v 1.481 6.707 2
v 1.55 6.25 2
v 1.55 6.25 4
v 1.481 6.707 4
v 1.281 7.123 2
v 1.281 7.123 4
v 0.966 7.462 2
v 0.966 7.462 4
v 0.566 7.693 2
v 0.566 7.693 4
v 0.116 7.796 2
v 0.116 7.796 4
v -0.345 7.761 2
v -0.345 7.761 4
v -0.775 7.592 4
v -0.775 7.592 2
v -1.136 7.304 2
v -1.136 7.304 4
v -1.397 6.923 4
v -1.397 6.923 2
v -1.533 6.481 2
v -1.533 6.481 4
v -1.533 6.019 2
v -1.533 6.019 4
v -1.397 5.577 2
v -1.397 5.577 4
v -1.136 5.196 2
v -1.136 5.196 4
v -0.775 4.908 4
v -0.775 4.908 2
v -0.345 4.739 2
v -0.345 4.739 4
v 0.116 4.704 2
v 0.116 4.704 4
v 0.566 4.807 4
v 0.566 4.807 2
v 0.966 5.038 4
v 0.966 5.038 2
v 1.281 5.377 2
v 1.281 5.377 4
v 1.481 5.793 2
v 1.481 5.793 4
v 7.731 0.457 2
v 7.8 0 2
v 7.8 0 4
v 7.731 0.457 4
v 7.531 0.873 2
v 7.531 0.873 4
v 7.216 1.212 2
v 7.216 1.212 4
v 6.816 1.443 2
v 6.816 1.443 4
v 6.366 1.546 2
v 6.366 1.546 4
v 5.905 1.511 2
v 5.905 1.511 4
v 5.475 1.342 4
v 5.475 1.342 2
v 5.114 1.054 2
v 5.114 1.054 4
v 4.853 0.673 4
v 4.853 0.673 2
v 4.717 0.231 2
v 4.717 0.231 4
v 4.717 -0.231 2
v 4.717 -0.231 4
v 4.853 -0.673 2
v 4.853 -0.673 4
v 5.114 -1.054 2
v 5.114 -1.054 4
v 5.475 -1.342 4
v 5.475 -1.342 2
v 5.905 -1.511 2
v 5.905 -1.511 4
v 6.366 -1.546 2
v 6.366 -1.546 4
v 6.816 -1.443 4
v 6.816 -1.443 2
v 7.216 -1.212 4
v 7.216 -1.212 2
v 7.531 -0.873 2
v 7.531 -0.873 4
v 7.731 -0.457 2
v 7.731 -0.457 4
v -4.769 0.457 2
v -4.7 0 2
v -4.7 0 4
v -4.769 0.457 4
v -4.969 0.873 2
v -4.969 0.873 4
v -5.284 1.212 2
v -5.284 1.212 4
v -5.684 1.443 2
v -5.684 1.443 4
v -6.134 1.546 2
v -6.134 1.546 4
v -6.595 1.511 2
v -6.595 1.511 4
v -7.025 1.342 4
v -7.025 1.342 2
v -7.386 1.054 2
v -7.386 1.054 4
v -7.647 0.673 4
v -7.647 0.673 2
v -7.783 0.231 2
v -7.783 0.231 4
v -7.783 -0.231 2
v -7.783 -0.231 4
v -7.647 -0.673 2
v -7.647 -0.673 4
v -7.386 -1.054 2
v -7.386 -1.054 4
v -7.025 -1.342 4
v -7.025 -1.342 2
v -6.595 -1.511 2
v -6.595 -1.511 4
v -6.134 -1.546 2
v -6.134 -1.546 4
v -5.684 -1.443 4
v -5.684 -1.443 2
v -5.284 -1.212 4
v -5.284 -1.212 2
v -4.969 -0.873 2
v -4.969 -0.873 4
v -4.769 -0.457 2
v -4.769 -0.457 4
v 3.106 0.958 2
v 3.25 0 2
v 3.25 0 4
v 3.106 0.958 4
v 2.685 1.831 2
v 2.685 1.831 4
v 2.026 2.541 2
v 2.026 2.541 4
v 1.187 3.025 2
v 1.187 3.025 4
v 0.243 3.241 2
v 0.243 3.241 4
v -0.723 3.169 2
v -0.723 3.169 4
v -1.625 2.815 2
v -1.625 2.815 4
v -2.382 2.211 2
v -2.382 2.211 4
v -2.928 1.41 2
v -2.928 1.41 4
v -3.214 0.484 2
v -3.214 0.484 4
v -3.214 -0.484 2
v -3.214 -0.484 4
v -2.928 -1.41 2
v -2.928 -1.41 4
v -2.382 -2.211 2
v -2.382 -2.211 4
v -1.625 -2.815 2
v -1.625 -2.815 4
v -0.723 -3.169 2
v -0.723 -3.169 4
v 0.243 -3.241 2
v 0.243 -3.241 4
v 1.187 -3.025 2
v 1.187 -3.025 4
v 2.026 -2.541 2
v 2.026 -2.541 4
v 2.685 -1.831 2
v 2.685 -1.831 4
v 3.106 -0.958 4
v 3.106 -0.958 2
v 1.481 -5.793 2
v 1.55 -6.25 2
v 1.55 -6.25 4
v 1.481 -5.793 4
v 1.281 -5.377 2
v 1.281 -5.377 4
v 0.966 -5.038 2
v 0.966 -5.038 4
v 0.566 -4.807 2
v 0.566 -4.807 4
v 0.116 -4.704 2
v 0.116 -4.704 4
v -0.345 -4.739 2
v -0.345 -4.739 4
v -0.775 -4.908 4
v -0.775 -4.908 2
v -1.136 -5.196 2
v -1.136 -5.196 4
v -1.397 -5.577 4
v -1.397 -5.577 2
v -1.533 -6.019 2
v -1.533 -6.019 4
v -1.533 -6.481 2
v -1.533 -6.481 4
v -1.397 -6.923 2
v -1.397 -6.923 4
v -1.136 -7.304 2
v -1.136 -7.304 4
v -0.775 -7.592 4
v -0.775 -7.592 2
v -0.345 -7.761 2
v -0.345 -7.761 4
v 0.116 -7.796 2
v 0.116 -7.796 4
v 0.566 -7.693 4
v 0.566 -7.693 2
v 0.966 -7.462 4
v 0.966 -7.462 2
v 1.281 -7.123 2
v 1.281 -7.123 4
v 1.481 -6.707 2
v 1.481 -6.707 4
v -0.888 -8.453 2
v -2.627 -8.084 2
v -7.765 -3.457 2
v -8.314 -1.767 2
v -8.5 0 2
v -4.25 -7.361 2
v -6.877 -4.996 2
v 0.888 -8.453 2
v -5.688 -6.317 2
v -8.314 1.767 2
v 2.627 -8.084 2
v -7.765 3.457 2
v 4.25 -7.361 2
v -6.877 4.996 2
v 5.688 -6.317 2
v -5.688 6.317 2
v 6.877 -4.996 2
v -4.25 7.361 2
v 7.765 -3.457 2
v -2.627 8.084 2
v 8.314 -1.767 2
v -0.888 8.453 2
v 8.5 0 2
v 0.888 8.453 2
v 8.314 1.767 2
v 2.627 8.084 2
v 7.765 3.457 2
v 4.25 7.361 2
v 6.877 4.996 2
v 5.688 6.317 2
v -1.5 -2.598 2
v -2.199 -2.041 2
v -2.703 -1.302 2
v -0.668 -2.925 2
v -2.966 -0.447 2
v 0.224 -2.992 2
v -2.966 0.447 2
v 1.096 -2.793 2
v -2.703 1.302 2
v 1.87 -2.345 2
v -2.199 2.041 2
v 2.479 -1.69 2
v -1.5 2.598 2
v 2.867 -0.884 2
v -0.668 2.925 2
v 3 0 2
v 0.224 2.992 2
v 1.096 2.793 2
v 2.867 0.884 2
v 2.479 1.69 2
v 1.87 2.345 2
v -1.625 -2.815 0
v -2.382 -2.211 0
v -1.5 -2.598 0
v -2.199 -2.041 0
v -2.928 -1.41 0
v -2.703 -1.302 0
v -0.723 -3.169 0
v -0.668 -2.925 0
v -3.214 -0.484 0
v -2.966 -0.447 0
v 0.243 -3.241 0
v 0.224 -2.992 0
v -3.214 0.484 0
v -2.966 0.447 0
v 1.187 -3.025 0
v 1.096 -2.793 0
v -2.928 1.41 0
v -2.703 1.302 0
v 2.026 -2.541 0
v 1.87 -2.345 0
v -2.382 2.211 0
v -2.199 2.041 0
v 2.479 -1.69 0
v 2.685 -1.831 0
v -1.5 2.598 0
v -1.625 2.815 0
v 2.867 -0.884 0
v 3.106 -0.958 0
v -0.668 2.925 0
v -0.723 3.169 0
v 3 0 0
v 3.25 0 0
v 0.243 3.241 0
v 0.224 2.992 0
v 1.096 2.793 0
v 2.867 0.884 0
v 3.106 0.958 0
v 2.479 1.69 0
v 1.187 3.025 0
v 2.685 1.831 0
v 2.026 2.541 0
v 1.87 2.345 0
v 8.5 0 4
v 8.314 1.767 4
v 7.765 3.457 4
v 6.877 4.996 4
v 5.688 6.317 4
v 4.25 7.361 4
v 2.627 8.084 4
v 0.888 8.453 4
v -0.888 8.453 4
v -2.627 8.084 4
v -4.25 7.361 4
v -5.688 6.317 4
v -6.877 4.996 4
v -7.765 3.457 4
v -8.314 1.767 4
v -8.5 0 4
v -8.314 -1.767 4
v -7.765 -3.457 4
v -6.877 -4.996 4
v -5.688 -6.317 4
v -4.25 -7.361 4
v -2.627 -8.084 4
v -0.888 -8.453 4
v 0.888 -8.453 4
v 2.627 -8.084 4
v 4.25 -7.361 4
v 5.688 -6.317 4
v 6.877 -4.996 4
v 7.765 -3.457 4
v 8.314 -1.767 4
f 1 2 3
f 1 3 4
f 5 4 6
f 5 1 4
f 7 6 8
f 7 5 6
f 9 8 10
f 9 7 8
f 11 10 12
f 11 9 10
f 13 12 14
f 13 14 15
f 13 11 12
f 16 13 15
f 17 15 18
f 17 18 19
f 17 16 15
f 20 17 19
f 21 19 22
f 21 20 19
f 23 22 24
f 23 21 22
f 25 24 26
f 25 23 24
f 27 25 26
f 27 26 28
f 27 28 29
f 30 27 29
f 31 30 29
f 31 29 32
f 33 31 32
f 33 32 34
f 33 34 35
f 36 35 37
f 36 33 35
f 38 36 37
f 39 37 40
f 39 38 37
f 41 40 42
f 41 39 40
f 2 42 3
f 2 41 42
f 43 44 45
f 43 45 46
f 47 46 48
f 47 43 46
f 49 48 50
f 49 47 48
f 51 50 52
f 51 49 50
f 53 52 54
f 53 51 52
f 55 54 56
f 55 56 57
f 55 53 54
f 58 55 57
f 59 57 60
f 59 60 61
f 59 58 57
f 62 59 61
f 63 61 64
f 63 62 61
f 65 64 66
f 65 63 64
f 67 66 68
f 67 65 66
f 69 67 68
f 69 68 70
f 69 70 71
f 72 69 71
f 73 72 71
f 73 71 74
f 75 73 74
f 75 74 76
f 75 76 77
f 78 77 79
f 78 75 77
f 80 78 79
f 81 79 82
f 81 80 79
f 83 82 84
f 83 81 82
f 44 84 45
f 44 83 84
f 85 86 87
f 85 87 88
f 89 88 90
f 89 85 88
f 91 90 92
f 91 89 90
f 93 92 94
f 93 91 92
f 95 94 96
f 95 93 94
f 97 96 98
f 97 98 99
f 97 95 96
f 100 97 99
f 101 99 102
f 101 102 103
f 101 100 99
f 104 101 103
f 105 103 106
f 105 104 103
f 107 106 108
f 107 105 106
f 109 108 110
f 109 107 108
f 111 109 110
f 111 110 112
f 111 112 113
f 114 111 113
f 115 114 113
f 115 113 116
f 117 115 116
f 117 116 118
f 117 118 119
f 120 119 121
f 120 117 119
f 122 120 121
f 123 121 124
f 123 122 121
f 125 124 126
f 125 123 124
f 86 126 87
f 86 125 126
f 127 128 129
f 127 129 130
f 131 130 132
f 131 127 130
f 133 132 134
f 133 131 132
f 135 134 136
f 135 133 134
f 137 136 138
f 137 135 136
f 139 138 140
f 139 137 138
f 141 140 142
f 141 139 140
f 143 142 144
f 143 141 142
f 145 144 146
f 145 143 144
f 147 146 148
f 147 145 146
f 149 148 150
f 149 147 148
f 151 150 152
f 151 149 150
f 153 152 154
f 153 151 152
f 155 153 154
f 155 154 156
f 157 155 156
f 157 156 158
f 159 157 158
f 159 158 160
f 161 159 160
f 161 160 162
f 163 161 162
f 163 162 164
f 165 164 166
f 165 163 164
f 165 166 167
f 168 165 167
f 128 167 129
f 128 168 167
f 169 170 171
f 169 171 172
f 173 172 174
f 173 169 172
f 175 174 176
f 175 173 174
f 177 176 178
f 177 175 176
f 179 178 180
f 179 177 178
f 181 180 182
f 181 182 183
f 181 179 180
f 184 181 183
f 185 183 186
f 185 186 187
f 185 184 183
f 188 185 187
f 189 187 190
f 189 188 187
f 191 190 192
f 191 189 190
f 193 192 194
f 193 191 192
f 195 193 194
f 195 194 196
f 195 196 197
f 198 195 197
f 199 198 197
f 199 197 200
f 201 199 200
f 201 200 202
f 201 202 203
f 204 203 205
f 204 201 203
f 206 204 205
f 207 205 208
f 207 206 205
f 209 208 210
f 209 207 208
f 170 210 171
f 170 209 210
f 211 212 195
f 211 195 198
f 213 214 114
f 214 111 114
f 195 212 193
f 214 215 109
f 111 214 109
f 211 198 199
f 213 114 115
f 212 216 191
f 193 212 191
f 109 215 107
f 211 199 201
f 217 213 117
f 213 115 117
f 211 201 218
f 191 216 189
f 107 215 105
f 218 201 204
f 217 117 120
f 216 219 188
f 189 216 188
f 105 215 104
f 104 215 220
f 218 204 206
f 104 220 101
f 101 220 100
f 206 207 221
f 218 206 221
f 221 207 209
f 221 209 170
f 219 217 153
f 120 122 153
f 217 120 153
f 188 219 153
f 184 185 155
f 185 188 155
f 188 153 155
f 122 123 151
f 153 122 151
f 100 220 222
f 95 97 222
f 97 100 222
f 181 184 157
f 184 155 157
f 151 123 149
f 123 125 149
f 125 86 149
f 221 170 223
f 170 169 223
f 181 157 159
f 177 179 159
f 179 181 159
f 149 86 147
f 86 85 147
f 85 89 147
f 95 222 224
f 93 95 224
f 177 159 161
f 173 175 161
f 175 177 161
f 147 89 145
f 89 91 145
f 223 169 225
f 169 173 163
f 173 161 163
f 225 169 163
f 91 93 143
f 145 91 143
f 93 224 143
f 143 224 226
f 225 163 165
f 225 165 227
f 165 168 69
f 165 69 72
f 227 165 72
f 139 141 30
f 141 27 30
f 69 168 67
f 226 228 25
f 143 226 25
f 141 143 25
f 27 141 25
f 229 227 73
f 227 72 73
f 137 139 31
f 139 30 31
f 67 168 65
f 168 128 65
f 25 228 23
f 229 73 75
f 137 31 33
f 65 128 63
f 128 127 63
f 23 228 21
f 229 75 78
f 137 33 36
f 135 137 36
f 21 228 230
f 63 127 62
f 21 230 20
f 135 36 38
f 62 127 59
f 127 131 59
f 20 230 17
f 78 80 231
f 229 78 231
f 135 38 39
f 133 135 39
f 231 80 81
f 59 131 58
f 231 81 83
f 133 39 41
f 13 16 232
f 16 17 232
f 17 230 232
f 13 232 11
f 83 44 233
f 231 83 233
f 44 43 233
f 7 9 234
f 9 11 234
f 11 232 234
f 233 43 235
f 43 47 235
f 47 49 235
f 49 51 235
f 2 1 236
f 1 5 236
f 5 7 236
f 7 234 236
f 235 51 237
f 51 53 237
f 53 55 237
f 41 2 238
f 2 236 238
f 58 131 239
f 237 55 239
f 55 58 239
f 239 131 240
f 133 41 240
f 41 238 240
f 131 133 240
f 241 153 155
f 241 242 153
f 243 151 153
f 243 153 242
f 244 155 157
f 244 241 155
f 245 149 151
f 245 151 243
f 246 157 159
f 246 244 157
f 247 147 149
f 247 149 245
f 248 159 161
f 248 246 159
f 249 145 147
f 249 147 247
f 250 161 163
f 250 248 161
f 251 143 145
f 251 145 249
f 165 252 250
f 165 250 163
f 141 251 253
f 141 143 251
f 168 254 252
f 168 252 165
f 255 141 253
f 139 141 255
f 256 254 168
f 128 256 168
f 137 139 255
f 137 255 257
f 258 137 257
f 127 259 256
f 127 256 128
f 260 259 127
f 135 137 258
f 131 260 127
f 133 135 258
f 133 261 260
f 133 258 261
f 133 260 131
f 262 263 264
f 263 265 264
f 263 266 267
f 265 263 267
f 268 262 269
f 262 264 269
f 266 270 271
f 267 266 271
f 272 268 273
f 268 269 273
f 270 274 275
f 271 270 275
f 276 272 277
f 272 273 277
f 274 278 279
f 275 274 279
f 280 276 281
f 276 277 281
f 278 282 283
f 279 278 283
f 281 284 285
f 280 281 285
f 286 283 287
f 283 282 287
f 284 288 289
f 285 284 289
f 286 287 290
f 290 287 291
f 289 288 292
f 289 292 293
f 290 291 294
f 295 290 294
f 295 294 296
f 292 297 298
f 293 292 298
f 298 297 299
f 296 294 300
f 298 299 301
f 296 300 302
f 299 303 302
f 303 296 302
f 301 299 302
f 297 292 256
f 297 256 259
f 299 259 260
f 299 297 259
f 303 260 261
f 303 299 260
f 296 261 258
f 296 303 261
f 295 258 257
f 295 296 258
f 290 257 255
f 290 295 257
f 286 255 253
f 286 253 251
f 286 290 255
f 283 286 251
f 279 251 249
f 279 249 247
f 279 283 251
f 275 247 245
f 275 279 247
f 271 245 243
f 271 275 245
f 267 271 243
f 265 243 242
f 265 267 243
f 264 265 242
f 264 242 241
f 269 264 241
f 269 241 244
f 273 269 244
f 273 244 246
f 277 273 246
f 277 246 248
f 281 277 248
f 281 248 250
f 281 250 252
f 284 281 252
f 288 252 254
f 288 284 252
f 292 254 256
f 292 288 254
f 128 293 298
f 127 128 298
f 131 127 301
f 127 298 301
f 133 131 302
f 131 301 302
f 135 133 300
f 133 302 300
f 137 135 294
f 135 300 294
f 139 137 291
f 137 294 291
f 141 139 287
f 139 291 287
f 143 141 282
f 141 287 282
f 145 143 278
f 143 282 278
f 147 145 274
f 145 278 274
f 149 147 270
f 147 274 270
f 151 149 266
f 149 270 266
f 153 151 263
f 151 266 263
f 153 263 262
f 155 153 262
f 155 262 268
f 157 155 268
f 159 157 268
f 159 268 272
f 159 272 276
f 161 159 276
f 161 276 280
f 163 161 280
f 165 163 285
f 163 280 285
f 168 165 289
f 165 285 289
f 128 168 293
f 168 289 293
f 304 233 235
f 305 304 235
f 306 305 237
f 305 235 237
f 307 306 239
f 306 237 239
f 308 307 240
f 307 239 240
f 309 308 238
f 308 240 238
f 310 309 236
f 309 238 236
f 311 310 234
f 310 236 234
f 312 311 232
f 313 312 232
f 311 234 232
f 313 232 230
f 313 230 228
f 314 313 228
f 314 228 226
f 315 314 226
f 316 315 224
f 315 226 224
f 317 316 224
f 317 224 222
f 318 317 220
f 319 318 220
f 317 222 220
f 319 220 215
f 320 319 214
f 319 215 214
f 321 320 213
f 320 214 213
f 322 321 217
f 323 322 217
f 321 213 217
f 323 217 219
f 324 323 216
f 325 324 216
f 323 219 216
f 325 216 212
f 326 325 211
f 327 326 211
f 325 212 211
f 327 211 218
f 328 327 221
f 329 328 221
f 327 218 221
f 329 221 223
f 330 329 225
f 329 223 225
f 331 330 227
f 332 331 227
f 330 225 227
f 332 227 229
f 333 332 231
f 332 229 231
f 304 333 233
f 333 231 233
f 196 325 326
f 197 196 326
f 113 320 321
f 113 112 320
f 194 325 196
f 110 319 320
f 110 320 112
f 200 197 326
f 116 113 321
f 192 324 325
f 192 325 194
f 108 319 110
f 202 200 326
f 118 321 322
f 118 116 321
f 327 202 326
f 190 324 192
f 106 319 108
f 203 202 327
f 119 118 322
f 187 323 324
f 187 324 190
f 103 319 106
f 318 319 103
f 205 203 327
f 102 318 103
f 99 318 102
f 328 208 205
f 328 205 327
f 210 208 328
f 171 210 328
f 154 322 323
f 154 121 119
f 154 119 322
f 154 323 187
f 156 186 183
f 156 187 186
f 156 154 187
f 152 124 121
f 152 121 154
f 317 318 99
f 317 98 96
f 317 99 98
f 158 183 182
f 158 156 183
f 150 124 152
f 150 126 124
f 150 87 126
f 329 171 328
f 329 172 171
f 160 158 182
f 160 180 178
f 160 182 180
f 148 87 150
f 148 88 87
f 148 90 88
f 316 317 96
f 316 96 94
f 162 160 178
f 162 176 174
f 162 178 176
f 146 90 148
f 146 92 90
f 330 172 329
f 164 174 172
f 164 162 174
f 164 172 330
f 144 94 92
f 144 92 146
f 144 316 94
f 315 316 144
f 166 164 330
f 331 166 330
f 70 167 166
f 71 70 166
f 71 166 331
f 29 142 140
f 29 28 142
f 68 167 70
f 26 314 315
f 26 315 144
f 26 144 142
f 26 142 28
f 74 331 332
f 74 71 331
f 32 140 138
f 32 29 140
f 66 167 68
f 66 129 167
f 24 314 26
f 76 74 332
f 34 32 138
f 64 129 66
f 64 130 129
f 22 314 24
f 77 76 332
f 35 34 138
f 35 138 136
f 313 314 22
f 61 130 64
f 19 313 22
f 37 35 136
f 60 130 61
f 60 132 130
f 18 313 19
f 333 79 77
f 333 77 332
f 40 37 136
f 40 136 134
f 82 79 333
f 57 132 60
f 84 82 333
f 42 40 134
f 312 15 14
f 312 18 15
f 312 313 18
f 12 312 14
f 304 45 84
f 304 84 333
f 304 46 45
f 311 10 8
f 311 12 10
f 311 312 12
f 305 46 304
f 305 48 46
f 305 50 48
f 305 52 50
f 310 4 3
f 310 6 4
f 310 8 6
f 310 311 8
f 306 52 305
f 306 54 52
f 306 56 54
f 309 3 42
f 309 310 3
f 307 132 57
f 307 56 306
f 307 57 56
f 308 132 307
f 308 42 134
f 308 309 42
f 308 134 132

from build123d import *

# Parameters (mm, degrees)
SKETCH_1_R      = 3.25
SKETCH_1_R_2    = 3
EXTRUDE_3_DEPTH = 2
SKETCH_3_R      = 8.5
SKETCH_3_R_2    = 1.55
SKETCH_3_R_3    = 3.25
EXTRUDE_4_DEPTH = 2


with BuildPart() as part:
    # 草图1 → 凸台-拉伸3 (new body)
    with BuildSketch(Plane.XY):
        Circle(SKETCH_1_R)
        Circle(SKETCH_1_R_2, mode=Mode.SUBTRACT)
    extrude(amount=EXTRUDE_3_DEPTH)


with BuildPart() as body_2:
    # 草图3 → 凸台-拉伸4 (new body)
    with BuildSketch(Plane.XY.offset(2)):
        Circle(SKETCH_3_R)
        with Locations((0, 6.25)):
            Circle(SKETCH_3_R_2, mode=Mode.SUBTRACT)
        with Locations((-6.25, 0)):
            Circle(SKETCH_3_R_2, mode=Mode.SUBTRACT)
        with Locations((0, -6.25)):
            Circle(SKETCH_3_R_2, mode=Mode.SUBTRACT)
        with Locations((6.25, 0)):
            Circle(SKETCH_3_R_2, mode=Mode.SUBTRACT)
        Circle(SKETCH_3_R_3, mode=Mode.SUBTRACT)
    extrude(amount=EXTRUDE_4_DEPTH)


solid = Compound([part.part, body_2.part])
